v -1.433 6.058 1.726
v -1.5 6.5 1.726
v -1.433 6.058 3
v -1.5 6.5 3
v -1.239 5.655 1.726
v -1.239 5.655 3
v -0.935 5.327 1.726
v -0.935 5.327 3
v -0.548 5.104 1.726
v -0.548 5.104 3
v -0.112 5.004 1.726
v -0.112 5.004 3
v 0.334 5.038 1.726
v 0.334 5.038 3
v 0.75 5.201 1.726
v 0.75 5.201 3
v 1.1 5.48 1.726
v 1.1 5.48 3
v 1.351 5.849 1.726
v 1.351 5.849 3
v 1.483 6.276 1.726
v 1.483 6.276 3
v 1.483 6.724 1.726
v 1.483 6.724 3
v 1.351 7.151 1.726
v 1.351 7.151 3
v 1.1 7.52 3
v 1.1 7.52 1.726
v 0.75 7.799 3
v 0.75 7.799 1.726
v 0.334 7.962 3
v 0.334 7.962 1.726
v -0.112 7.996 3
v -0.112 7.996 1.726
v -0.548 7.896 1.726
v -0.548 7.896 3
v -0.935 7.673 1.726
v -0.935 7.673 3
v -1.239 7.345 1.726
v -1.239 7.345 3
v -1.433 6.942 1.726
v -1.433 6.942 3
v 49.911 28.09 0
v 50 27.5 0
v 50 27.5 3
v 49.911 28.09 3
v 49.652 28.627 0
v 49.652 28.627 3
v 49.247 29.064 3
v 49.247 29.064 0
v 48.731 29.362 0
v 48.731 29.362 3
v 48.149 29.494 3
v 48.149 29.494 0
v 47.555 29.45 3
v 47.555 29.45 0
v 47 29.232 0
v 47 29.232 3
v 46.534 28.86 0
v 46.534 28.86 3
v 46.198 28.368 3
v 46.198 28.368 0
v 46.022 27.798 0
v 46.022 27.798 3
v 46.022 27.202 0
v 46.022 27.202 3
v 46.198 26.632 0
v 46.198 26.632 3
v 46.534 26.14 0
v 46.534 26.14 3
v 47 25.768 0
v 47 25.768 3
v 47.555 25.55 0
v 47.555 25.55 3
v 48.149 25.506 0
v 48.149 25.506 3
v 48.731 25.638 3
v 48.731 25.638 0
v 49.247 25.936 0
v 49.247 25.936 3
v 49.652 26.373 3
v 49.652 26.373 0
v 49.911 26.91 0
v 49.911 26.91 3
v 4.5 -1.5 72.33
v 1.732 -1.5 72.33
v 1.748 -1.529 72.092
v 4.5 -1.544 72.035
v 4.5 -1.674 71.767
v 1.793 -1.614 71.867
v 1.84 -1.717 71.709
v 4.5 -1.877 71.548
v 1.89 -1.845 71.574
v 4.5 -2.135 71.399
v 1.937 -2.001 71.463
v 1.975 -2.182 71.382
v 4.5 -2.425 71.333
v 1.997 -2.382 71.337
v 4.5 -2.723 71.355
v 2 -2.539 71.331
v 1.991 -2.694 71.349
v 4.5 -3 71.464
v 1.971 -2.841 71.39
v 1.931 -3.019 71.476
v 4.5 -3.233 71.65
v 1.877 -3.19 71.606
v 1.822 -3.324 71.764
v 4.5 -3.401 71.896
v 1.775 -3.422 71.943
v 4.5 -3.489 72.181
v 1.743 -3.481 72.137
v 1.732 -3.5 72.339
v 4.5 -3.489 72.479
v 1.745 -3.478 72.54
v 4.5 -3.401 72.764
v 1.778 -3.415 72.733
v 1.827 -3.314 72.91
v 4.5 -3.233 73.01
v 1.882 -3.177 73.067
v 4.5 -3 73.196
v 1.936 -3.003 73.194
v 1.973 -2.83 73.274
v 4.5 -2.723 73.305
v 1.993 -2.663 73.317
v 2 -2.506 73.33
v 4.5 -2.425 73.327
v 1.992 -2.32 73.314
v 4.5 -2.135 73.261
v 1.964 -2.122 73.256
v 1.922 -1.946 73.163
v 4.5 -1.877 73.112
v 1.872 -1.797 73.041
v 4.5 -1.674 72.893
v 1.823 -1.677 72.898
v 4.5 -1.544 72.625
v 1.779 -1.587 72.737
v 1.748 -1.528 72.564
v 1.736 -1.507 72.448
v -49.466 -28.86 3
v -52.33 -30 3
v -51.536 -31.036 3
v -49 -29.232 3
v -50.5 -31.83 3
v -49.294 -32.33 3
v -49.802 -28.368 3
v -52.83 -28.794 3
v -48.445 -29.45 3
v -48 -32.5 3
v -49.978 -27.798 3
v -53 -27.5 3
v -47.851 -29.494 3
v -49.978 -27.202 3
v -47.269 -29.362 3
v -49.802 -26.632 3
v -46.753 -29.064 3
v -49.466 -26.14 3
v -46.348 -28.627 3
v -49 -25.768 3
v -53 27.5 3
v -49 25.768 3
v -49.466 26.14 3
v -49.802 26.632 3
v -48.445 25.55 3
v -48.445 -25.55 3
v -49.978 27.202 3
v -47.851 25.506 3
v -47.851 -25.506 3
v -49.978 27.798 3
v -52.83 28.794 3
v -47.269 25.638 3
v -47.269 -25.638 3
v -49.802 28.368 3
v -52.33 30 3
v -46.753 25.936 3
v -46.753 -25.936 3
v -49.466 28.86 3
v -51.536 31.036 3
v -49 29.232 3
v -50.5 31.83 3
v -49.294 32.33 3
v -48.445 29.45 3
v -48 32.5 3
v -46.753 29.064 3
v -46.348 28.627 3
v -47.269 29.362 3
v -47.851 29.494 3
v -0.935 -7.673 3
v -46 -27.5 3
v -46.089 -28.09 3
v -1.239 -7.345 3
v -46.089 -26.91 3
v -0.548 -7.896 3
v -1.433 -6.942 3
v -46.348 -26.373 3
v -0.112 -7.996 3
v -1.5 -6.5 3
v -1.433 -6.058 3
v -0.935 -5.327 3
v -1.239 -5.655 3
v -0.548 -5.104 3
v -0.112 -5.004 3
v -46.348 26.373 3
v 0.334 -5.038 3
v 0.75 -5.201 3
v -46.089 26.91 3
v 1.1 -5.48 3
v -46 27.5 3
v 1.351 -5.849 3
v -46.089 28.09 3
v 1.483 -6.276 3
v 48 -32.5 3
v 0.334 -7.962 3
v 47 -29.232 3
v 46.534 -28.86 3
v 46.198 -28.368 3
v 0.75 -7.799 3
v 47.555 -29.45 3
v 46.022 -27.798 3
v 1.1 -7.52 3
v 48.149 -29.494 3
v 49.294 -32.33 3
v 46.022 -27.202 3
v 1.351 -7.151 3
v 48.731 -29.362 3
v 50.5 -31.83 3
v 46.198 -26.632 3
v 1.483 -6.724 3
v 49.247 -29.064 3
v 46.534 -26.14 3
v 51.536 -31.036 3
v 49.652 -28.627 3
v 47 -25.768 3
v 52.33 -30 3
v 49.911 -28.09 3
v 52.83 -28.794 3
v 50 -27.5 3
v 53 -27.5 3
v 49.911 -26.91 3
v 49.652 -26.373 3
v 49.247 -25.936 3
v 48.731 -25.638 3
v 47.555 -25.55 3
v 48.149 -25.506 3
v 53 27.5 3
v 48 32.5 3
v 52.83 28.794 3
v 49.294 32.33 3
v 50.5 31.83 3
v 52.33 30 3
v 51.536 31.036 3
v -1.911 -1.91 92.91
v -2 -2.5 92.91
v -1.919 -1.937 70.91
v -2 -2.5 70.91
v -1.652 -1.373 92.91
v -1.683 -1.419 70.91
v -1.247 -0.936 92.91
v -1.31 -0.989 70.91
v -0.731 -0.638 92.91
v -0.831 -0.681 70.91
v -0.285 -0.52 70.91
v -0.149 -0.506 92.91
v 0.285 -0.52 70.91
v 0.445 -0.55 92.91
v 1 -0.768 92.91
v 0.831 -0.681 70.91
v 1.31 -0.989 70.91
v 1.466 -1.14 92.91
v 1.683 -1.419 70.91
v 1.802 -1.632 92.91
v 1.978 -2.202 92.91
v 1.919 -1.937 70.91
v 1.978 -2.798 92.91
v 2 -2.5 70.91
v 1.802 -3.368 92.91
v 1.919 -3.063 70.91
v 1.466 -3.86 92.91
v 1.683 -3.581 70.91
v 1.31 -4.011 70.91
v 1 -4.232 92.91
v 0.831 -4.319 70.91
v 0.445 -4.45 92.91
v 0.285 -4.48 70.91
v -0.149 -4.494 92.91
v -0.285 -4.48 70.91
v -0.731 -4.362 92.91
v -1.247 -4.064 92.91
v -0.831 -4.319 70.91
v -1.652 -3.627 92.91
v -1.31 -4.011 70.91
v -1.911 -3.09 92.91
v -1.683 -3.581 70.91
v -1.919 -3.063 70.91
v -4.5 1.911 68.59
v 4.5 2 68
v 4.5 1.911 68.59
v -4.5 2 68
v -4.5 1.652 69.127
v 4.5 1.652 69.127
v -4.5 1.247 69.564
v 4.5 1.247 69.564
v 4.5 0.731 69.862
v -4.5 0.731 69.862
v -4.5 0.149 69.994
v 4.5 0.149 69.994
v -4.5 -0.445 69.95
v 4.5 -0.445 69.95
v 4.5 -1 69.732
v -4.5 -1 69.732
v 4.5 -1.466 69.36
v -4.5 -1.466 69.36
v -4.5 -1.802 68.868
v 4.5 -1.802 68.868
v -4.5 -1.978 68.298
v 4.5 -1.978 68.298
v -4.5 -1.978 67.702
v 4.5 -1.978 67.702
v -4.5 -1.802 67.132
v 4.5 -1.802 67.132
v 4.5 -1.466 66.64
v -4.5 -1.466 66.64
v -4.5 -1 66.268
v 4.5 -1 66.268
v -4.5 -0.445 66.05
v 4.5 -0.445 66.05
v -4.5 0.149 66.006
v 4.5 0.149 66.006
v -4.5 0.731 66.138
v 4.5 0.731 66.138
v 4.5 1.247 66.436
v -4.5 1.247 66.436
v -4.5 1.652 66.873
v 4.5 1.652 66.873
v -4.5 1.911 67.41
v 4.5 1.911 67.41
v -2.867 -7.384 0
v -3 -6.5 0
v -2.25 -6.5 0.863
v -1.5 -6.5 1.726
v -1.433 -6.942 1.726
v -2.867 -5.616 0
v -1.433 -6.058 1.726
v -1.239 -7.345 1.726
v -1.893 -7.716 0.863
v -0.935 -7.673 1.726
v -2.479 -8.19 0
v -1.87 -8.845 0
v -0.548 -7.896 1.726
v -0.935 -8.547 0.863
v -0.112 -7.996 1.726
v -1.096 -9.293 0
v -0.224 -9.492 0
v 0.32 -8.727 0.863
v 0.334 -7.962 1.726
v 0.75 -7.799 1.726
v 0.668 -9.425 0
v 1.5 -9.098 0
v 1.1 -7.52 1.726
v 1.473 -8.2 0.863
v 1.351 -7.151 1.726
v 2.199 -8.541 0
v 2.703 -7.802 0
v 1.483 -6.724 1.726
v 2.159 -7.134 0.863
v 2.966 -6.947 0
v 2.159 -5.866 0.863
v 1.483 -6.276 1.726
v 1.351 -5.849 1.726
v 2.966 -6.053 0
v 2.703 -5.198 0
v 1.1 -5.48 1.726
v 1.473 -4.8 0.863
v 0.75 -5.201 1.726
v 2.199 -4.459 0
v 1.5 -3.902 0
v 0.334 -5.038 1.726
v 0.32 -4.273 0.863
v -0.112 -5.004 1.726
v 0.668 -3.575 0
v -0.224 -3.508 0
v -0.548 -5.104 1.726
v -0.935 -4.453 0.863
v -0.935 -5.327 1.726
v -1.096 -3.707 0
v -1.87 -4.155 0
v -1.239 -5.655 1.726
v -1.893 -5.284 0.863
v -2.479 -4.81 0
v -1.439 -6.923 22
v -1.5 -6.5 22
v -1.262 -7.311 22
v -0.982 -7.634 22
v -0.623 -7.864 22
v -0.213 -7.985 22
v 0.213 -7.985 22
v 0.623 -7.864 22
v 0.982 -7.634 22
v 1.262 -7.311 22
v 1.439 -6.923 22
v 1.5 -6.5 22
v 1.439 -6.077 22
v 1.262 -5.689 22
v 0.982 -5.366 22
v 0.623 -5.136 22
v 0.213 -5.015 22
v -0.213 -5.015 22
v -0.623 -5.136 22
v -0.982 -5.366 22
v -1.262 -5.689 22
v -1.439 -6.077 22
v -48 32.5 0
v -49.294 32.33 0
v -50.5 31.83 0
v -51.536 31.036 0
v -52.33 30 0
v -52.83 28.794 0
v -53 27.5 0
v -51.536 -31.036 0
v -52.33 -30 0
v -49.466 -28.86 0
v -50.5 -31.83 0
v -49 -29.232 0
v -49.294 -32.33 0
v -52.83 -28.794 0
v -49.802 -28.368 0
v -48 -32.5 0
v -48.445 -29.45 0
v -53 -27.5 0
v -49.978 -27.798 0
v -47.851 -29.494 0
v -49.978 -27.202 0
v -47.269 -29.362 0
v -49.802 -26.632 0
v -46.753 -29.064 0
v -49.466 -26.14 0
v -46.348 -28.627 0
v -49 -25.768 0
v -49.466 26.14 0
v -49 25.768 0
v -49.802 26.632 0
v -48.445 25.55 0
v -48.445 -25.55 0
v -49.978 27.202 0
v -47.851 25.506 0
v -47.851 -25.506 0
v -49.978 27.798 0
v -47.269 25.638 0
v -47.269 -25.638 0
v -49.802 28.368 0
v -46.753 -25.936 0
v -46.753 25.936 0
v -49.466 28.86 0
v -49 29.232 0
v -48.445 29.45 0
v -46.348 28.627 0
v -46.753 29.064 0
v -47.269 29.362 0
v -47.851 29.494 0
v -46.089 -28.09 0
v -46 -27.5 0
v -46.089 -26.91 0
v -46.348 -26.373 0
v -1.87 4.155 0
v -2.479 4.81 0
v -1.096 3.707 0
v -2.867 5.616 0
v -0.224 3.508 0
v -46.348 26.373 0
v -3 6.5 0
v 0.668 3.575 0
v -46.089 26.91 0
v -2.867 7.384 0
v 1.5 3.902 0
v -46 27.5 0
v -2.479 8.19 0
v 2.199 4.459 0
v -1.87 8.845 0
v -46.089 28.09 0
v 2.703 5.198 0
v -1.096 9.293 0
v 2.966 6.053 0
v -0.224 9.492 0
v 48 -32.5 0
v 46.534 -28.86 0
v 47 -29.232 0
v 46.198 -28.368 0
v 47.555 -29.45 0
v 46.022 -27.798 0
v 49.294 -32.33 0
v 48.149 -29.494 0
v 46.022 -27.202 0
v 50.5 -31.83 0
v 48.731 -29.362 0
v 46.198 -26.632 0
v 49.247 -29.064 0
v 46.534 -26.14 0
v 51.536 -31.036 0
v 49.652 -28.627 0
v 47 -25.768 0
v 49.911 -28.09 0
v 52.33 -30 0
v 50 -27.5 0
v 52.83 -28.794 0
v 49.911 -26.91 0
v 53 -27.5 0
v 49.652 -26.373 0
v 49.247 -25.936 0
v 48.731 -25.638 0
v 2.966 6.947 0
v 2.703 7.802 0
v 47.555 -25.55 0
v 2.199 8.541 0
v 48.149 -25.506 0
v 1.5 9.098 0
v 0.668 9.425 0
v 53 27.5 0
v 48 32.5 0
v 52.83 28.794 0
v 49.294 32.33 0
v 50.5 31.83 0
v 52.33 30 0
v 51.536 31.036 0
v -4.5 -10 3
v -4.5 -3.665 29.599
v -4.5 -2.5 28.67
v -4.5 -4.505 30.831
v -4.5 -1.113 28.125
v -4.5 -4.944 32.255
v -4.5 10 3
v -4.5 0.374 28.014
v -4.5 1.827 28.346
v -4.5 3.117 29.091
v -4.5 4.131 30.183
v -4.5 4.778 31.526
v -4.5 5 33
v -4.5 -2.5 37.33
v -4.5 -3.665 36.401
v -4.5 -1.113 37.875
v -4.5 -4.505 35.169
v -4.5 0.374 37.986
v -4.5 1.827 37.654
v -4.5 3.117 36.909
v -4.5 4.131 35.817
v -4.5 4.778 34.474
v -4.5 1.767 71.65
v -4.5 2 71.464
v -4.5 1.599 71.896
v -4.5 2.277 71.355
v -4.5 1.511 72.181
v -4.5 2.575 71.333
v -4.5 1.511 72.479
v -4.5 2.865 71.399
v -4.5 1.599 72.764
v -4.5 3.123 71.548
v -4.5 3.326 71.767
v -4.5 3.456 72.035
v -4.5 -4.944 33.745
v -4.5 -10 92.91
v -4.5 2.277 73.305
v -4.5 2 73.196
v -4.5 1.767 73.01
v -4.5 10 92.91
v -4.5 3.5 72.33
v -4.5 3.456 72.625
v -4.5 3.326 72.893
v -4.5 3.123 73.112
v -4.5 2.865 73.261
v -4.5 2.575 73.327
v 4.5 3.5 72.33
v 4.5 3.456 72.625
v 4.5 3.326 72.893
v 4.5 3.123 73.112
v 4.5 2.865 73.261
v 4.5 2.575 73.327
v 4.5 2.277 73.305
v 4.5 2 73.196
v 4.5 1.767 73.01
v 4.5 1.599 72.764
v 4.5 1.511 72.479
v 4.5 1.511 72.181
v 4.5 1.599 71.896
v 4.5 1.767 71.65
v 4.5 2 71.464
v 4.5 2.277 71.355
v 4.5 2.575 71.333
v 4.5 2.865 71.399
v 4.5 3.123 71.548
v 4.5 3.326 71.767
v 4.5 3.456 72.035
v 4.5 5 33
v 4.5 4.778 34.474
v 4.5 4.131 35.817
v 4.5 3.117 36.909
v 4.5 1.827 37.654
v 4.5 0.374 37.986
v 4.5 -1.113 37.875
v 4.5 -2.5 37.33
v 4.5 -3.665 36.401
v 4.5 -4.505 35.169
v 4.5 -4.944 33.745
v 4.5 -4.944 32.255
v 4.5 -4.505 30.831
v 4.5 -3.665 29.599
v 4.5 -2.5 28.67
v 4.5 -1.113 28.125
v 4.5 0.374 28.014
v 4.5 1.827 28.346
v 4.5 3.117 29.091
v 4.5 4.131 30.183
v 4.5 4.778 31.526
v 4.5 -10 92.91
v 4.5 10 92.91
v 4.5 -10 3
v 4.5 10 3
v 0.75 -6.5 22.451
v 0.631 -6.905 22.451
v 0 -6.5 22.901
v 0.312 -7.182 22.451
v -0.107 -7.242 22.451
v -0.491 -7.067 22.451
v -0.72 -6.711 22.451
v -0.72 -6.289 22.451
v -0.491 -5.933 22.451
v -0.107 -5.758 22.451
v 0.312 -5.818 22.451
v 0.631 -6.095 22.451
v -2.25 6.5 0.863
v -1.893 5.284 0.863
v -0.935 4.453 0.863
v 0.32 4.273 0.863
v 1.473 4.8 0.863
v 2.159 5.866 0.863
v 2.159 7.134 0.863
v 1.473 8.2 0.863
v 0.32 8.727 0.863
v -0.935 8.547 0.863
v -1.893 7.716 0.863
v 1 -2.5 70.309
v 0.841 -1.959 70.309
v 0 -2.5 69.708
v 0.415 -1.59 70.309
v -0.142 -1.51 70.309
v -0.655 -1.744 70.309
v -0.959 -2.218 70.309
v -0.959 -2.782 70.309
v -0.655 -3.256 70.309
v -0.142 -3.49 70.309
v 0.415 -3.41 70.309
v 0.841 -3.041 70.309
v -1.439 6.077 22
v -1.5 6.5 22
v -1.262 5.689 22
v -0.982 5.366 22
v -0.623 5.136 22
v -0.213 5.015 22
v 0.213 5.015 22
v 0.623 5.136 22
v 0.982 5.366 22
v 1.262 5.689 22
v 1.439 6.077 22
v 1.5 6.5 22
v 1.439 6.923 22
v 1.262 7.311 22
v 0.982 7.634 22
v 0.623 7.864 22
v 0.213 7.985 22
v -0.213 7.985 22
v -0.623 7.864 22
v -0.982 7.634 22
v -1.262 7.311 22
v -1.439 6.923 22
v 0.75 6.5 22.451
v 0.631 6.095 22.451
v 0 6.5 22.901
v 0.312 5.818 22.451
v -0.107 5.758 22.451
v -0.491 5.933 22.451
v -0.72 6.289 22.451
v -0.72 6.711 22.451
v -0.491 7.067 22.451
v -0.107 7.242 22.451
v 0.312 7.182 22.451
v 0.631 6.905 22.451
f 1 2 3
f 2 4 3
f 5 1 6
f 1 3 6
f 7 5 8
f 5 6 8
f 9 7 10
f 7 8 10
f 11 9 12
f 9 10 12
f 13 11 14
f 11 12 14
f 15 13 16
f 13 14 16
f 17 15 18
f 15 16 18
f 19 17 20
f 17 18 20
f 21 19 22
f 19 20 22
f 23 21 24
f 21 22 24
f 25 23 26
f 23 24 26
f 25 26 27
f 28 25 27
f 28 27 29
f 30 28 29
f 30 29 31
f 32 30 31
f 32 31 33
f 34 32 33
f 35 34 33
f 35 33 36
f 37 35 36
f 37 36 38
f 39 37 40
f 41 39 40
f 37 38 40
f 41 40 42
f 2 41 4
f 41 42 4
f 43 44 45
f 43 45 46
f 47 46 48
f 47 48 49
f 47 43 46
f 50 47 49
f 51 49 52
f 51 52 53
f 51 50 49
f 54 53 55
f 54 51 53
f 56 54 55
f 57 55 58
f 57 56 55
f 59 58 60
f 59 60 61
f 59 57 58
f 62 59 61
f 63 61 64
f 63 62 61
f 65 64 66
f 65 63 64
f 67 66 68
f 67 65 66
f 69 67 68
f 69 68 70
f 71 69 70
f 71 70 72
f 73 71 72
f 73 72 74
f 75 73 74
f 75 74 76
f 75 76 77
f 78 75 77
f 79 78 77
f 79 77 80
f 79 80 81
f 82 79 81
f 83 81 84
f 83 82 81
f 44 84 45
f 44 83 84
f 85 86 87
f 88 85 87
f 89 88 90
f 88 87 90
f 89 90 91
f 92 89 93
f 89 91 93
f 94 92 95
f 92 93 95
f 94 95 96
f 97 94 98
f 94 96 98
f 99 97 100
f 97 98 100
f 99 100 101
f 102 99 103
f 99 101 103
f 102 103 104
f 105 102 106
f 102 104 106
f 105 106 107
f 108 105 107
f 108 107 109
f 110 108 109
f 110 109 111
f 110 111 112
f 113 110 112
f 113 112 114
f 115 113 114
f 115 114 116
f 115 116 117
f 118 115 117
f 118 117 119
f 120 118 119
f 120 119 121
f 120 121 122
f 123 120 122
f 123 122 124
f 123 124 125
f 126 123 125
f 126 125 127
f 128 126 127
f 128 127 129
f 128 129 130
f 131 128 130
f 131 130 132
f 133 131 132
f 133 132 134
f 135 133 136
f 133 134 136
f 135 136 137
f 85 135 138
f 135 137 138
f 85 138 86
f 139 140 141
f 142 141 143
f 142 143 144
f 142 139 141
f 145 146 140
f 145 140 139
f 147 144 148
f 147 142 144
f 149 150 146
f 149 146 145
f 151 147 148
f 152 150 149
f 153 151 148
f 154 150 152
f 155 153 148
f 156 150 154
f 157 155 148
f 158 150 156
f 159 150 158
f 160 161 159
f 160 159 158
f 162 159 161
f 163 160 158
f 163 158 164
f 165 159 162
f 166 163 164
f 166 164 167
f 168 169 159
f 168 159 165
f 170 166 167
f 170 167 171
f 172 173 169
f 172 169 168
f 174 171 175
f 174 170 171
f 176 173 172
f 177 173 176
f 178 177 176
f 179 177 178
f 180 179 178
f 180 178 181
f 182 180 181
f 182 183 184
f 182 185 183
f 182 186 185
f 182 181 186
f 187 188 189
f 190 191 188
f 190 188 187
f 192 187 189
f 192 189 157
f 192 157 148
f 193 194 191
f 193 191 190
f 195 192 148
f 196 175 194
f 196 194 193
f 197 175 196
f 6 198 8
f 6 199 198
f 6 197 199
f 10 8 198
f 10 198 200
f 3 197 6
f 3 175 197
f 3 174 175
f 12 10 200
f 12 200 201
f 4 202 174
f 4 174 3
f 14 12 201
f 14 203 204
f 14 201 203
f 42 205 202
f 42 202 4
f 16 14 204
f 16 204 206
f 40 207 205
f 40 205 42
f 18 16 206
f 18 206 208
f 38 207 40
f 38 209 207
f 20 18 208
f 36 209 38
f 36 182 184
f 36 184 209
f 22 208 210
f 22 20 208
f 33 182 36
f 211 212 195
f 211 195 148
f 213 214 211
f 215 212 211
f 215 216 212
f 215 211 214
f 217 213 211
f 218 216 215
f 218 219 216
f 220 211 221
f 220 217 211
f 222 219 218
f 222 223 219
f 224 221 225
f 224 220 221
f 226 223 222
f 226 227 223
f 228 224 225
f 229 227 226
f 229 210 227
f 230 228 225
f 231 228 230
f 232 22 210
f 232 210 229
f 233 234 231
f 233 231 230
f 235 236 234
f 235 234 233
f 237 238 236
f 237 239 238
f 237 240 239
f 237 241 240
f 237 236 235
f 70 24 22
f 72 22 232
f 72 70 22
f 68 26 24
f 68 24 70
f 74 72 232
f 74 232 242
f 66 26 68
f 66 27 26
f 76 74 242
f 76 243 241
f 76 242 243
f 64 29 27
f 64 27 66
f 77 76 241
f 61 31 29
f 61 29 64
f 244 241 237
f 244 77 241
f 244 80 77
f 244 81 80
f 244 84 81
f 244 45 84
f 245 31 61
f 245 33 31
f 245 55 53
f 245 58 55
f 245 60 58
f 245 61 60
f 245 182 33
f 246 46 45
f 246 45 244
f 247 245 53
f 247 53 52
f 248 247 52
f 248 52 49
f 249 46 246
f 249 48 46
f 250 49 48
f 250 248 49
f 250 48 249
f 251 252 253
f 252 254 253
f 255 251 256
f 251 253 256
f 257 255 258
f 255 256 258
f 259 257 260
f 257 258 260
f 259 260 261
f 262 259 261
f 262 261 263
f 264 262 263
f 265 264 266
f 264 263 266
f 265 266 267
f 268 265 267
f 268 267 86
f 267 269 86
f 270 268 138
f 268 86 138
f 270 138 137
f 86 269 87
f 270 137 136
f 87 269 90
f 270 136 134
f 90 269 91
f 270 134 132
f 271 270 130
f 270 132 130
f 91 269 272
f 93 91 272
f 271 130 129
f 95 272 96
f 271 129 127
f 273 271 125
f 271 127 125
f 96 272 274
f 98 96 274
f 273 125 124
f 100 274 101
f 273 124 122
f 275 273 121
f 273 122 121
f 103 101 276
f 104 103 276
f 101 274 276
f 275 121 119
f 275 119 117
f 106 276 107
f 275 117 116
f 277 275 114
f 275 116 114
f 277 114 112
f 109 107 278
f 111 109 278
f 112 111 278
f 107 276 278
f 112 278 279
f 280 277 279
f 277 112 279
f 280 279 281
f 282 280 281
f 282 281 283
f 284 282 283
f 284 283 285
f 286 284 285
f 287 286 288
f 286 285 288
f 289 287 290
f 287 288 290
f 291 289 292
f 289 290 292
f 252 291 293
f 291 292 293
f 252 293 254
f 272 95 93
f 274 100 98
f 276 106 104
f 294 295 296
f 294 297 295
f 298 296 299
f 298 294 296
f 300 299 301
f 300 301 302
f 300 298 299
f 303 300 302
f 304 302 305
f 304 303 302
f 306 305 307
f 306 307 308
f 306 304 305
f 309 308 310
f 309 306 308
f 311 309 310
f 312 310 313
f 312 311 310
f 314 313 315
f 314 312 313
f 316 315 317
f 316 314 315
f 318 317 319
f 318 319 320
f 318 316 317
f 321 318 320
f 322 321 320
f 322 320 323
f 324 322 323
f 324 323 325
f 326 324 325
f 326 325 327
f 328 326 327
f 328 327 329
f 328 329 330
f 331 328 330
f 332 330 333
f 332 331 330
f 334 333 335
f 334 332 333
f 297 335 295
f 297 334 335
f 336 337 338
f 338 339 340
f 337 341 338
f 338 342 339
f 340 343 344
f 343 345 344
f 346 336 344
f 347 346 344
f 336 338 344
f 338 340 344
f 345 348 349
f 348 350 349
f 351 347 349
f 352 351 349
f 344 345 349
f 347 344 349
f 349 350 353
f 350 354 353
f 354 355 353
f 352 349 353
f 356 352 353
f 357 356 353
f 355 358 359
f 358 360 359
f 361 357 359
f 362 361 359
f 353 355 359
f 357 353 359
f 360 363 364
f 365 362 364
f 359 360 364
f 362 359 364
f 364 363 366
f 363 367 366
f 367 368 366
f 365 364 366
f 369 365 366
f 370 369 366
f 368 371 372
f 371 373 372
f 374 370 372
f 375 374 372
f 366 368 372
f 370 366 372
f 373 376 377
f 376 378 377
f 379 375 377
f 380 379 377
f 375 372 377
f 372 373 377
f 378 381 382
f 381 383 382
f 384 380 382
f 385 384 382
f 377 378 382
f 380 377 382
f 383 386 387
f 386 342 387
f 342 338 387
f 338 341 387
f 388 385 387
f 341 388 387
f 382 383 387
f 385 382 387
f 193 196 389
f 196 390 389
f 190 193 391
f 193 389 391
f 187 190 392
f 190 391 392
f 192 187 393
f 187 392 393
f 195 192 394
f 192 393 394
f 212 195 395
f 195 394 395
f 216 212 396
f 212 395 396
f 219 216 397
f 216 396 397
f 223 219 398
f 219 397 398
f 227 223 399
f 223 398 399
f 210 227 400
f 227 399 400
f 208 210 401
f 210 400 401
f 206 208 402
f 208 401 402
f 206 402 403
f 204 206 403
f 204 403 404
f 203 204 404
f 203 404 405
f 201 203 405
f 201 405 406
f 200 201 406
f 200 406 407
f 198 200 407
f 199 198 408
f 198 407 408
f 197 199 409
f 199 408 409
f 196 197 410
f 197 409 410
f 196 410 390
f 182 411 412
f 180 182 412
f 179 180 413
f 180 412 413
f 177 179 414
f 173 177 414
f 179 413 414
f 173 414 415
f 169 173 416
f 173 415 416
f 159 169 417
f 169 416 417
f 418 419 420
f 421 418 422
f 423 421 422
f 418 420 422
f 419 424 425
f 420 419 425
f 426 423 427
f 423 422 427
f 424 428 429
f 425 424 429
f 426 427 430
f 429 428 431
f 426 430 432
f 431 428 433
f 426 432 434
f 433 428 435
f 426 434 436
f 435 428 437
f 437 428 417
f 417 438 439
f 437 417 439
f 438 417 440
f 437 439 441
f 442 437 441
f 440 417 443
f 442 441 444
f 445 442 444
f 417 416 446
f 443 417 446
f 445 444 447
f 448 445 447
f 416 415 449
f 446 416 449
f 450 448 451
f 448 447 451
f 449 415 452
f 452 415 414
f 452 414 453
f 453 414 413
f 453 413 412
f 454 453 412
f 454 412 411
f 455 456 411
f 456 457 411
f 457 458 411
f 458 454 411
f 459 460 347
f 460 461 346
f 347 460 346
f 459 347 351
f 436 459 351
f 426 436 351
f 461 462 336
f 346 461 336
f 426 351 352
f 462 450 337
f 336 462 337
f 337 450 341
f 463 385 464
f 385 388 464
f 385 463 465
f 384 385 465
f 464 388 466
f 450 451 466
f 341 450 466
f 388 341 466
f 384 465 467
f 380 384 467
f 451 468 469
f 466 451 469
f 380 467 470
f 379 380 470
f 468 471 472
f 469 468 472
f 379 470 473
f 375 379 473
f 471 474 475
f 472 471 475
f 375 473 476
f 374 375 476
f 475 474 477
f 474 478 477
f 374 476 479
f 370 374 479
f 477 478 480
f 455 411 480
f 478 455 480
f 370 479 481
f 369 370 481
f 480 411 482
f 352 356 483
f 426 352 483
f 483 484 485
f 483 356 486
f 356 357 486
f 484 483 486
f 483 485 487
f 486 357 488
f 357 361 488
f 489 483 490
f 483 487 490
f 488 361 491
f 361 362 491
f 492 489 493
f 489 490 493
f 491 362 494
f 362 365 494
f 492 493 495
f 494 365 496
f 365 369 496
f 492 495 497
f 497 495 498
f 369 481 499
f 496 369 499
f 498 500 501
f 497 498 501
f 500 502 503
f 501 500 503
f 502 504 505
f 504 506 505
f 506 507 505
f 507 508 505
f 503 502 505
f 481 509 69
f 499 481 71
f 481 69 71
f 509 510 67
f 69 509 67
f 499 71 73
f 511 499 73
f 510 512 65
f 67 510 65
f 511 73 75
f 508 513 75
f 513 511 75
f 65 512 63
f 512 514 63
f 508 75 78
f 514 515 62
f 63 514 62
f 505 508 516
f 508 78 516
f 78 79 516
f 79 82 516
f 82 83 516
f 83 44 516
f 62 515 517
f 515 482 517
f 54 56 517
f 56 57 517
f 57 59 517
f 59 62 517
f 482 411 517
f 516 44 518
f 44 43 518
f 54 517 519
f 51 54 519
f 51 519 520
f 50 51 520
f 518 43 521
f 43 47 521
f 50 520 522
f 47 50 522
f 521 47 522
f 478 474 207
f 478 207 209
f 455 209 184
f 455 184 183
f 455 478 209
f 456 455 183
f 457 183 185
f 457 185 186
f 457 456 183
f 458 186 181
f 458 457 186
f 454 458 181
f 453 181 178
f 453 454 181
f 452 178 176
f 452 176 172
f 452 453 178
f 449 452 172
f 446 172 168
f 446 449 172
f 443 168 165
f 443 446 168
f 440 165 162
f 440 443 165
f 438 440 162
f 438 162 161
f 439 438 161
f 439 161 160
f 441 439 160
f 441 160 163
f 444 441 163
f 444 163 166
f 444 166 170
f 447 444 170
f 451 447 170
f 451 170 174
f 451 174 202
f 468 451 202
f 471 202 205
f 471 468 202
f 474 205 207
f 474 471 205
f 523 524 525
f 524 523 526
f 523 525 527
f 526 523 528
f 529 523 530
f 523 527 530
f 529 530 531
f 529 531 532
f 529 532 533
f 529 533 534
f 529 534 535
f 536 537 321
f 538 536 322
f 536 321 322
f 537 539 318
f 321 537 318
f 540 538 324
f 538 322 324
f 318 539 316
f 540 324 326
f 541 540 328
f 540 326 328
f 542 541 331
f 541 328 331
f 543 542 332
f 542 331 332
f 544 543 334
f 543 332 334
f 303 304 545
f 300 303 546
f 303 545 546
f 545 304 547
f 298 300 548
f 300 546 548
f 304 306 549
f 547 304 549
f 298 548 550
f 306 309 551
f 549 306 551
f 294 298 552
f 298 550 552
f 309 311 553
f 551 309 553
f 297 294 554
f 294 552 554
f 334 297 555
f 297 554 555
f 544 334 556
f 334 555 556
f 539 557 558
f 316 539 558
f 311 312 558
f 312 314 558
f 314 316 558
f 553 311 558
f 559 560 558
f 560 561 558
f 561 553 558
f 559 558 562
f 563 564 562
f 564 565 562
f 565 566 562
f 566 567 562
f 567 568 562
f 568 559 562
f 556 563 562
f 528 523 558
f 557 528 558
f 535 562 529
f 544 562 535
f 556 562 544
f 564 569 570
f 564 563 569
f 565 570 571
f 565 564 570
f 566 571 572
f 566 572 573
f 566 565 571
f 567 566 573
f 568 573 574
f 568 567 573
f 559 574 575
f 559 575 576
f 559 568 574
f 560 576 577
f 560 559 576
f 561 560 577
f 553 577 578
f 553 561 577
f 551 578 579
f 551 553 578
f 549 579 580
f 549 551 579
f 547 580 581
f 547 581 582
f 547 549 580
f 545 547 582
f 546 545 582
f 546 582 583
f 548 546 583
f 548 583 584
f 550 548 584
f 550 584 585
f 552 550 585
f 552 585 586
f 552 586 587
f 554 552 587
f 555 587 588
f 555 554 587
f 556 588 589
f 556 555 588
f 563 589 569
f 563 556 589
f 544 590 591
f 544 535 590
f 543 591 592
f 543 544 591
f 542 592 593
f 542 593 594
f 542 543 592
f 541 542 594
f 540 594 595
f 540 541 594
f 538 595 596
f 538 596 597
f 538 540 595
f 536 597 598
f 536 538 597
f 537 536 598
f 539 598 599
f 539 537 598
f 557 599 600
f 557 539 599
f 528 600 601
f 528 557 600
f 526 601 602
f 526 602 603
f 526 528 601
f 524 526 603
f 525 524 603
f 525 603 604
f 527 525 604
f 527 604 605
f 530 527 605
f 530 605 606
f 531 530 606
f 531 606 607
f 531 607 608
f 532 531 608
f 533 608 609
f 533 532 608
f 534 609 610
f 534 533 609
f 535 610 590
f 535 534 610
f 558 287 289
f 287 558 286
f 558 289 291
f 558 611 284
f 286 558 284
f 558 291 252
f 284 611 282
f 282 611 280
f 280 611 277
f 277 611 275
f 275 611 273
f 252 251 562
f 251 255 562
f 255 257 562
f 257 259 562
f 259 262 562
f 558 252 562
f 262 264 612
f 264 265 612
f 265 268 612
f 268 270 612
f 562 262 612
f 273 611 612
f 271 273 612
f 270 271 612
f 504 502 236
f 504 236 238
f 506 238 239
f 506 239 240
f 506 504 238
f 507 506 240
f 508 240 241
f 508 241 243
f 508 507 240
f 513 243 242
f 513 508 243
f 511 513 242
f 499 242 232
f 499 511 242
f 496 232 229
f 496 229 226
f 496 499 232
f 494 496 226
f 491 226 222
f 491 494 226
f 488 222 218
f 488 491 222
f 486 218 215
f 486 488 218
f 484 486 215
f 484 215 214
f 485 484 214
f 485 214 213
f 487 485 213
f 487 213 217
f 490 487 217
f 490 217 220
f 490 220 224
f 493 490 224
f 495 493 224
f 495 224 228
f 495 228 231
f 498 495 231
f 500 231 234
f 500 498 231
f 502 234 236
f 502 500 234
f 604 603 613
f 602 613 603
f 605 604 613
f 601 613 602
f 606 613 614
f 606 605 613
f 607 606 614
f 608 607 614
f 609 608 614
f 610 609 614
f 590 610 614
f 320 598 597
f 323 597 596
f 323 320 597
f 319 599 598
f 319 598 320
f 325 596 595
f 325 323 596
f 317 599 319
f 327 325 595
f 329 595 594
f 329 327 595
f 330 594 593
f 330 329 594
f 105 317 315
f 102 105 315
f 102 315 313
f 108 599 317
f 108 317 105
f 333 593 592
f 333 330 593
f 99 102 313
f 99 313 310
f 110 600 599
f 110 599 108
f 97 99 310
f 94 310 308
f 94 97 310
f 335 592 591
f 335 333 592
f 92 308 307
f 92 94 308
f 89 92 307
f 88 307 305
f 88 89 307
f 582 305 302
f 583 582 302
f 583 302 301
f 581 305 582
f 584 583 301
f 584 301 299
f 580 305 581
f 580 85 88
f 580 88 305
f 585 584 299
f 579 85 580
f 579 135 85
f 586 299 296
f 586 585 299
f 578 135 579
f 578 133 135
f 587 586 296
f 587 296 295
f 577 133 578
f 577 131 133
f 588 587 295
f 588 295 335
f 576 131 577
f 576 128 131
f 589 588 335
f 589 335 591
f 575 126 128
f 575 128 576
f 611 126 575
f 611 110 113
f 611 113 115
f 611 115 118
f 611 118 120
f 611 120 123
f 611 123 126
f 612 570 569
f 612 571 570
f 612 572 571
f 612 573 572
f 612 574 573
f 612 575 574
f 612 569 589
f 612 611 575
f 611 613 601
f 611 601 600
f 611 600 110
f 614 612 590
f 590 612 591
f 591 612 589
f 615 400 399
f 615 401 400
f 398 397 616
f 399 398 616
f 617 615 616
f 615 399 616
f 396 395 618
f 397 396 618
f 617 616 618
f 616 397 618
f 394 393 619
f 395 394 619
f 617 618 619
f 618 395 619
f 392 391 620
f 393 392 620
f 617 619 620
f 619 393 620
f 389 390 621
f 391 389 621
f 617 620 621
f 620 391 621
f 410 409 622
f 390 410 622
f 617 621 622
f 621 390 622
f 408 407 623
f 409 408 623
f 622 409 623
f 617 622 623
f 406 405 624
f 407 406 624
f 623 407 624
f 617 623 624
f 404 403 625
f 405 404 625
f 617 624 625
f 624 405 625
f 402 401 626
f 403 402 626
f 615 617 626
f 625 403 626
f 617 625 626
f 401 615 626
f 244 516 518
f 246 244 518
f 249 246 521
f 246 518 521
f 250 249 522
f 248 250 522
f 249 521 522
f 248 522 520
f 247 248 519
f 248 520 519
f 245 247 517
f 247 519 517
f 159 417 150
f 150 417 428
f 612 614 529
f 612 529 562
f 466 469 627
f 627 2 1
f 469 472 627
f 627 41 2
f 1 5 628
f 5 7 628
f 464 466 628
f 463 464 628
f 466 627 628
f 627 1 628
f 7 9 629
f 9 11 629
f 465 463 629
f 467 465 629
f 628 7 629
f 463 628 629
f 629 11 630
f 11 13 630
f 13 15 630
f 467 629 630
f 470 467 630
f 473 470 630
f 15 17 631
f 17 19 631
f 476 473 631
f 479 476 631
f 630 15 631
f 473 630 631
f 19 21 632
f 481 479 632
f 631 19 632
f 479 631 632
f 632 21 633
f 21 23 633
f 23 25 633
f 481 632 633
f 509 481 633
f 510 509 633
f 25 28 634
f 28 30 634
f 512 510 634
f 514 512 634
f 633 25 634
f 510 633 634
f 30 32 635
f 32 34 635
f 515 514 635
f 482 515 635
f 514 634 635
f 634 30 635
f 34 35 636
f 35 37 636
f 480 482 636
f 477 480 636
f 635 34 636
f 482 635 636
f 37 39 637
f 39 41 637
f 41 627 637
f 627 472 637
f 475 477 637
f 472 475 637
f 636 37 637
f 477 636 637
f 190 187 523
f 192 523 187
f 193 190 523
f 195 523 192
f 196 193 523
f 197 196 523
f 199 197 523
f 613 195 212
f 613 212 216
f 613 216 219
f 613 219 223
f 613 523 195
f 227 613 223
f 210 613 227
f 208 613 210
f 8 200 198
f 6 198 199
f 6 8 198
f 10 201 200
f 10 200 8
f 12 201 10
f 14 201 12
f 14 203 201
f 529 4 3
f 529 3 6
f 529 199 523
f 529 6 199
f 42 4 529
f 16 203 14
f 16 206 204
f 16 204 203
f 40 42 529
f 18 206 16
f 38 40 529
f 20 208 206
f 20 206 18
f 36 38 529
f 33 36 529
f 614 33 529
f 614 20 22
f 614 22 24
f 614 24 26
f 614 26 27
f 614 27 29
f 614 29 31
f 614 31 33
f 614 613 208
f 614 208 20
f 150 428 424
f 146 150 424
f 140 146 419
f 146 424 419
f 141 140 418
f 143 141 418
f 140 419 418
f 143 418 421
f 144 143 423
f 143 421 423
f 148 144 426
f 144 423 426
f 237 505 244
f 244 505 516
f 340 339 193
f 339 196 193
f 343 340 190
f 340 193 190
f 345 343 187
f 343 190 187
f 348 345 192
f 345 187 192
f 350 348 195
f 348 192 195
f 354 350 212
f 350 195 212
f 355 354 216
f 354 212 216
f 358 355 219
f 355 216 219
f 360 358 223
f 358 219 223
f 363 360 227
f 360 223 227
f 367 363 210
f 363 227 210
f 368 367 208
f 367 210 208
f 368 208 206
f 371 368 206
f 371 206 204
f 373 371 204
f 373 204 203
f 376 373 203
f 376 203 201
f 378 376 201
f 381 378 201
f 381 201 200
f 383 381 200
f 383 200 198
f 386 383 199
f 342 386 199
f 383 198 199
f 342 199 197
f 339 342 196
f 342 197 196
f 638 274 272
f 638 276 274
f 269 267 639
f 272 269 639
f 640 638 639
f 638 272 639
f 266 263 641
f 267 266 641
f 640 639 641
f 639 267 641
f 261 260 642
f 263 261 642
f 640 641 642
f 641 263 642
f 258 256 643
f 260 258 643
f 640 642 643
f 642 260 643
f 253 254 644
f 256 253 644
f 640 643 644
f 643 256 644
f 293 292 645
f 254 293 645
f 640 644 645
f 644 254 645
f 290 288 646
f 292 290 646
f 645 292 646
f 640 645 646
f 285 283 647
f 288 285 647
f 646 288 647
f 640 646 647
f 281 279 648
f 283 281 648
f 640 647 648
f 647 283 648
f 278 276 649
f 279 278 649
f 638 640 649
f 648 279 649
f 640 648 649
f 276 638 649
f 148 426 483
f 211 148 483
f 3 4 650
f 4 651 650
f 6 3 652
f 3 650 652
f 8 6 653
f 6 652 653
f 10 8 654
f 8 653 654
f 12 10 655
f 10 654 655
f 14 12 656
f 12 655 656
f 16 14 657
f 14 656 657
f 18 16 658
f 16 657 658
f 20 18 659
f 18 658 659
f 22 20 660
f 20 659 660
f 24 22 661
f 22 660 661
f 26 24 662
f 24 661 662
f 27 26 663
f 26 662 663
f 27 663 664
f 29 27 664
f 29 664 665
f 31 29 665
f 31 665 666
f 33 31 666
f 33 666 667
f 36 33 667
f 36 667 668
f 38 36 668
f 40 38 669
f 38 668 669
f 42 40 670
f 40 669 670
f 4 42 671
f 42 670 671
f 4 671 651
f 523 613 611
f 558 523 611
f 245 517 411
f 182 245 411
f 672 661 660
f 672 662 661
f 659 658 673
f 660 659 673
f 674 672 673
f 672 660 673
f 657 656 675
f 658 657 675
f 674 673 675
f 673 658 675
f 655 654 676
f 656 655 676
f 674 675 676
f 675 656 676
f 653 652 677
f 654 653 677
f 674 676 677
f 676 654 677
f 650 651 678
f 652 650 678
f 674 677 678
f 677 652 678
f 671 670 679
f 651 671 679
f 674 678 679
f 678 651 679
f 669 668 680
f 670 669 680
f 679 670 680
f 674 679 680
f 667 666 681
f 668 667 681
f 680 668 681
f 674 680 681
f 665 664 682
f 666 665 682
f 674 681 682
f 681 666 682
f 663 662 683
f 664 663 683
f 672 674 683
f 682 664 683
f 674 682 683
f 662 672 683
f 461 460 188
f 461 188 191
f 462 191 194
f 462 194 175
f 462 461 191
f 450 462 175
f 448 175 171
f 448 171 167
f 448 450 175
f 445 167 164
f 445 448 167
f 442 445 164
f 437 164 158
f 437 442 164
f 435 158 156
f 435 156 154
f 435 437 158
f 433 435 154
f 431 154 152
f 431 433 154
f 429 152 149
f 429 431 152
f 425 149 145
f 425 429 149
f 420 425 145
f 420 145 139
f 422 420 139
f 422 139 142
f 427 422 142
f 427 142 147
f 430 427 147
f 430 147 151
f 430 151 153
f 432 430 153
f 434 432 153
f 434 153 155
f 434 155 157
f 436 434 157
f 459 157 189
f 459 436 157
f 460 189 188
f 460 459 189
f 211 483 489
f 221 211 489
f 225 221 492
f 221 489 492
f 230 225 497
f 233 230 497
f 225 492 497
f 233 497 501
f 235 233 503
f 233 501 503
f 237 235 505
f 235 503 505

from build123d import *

# Parameters (mm, degrees)
F0_R           = 2
F1_DEPTH       = 3
F2_D           = 3
F2_CSINK_D     = 6
F2_CSINK_ANGLE = 82
F3_W           = 20
F3_H           = 89.91
F3_R           = 5
F3_R_2         = 1
F3_R_3         = 2
F4_DEPTH       = 4.5
F5_D           = 2
F5_DEPTH       = 4.501
F7_D           = 4
F7_DEPTH       = 22
F7_TIP         = 1.2017212381
F9_D           = 3
F9_DEPTH       = 22
F9_TIP         = 0.9012909285


with BuildPart() as f1:
    # F0 (on Top) → F1 (new body)
    with BuildSketch(Plane.XY):
        with BuildLine():
            ThreePointArc((53, 27.5), (51.5355339059, 31.0355339059), (48, 32.5))
            Line((48, 32.5), (-48, 32.5))
            ThreePointArc((-48, 32.5), (-51.5355339059, 31.0355339059), (-53, 27.5))
            Line((-53, 27.5), (-53, -27.5))
            ThreePointArc((-53, -27.5), (-51.5355339059, -31.0355339059), (-48, -32.5))
            Line((-48, -32.5), (48, -32.5))
            ThreePointArc((48, -32.5), (51.5355339059, -31.0355339059), (53, -27.5))
            Line((53, -27.5), (53, 27.5))
        make_face()
        with Locations((-48, -27.5)):
            Circle(F0_R, mode=Mode.SUBTRACT)
        with Locations((48, -27.5)):
            Circle(F0_R, mode=Mode.SUBTRACT)
        with Locations((-48, 27.5)):
            Circle(F0_R, mode=Mode.SUBTRACT)
        with Locations((48, 27.5)):
            Circle(F0_R, mode=Mode.SUBTRACT)
    extrude(amount=F1_DEPTH)

    # F2 (through all)
    with Locations(Plane(origin=(0, 0, 0), x_dir=(1, 0, 0), z_dir=(0, 0, -1))):
        with Locations((0, -6.5), (0, 6.5)):
            CounterSinkHole(F2_D / 2, F2_CSINK_D / 2, counter_sink_angle=F2_CSINK_ANGLE)


with BuildPart() as f4:
    # F3 (on Right) → F4 (new body, symmetric)
    with BuildSketch(Plane.YZ):
        with Locations((0, 47.955)):
            Rectangle(F3_W, F3_H)
        with Locations((0, 33)):
            Circle(F3_R, mode=Mode.SUBTRACT)
        with Locations((-2.5, 72.3301270189)):
            Circle(F3_R_2, mode=Mode.SUBTRACT)
        with Locations((0, 68)):
            Circle(F3_R_3, mode=Mode.SUBTRACT)
        with Locations((2.5, 72.3301270189)):
            Circle(F3_R_2, mode=Mode.SUBTRACT)
        with Locations((-2.5, 72.3301270189)):
            Circle(F3_R_2)
    extrude(amount=F4_DEPTH, both=True)

    # F5 (through all, one way)
    with BuildSketch(Plane(origin=(0, 0, 0), x_dir=(0, 1, 0), z_dir=(-1, 0, 0))):
        with Locations((-2.5, -72.3301270189)):
            Circle(F5_D / 2)
    extrude(amount=-F5_DEPTH, mode=Mode.SUBTRACT)

    # F7
    with Locations(Plane.XY.offset(92.91)):
        with Locations((0, -2.5)):
            Hole(F7_D / 2, depth=F7_DEPTH)
            with Locations((0, 0, -(F7_DEPTH + F7_TIP / 2))):  # 118° drill point
                Cone(0, F7_D / 2, F7_TIP, mode=Mode.SUBTRACT)

    # F9
    with Locations(Plane(origin=(0, 0, 0), x_dir=(1, 0, 0), z_dir=(0, 0, -1))):
        with Locations((0, 6.5), (0, -6.5)):
            Hole(F9_D / 2, depth=F9_DEPTH)
            with Locations((0, 0, -(F9_DEPTH + F9_TIP / 2))):  # 118° drill point
                Cone(0, F9_D / 2, F9_TIP, mode=Mode.SUBTRACT)


solid = Compound([f1.part, f4.part])
